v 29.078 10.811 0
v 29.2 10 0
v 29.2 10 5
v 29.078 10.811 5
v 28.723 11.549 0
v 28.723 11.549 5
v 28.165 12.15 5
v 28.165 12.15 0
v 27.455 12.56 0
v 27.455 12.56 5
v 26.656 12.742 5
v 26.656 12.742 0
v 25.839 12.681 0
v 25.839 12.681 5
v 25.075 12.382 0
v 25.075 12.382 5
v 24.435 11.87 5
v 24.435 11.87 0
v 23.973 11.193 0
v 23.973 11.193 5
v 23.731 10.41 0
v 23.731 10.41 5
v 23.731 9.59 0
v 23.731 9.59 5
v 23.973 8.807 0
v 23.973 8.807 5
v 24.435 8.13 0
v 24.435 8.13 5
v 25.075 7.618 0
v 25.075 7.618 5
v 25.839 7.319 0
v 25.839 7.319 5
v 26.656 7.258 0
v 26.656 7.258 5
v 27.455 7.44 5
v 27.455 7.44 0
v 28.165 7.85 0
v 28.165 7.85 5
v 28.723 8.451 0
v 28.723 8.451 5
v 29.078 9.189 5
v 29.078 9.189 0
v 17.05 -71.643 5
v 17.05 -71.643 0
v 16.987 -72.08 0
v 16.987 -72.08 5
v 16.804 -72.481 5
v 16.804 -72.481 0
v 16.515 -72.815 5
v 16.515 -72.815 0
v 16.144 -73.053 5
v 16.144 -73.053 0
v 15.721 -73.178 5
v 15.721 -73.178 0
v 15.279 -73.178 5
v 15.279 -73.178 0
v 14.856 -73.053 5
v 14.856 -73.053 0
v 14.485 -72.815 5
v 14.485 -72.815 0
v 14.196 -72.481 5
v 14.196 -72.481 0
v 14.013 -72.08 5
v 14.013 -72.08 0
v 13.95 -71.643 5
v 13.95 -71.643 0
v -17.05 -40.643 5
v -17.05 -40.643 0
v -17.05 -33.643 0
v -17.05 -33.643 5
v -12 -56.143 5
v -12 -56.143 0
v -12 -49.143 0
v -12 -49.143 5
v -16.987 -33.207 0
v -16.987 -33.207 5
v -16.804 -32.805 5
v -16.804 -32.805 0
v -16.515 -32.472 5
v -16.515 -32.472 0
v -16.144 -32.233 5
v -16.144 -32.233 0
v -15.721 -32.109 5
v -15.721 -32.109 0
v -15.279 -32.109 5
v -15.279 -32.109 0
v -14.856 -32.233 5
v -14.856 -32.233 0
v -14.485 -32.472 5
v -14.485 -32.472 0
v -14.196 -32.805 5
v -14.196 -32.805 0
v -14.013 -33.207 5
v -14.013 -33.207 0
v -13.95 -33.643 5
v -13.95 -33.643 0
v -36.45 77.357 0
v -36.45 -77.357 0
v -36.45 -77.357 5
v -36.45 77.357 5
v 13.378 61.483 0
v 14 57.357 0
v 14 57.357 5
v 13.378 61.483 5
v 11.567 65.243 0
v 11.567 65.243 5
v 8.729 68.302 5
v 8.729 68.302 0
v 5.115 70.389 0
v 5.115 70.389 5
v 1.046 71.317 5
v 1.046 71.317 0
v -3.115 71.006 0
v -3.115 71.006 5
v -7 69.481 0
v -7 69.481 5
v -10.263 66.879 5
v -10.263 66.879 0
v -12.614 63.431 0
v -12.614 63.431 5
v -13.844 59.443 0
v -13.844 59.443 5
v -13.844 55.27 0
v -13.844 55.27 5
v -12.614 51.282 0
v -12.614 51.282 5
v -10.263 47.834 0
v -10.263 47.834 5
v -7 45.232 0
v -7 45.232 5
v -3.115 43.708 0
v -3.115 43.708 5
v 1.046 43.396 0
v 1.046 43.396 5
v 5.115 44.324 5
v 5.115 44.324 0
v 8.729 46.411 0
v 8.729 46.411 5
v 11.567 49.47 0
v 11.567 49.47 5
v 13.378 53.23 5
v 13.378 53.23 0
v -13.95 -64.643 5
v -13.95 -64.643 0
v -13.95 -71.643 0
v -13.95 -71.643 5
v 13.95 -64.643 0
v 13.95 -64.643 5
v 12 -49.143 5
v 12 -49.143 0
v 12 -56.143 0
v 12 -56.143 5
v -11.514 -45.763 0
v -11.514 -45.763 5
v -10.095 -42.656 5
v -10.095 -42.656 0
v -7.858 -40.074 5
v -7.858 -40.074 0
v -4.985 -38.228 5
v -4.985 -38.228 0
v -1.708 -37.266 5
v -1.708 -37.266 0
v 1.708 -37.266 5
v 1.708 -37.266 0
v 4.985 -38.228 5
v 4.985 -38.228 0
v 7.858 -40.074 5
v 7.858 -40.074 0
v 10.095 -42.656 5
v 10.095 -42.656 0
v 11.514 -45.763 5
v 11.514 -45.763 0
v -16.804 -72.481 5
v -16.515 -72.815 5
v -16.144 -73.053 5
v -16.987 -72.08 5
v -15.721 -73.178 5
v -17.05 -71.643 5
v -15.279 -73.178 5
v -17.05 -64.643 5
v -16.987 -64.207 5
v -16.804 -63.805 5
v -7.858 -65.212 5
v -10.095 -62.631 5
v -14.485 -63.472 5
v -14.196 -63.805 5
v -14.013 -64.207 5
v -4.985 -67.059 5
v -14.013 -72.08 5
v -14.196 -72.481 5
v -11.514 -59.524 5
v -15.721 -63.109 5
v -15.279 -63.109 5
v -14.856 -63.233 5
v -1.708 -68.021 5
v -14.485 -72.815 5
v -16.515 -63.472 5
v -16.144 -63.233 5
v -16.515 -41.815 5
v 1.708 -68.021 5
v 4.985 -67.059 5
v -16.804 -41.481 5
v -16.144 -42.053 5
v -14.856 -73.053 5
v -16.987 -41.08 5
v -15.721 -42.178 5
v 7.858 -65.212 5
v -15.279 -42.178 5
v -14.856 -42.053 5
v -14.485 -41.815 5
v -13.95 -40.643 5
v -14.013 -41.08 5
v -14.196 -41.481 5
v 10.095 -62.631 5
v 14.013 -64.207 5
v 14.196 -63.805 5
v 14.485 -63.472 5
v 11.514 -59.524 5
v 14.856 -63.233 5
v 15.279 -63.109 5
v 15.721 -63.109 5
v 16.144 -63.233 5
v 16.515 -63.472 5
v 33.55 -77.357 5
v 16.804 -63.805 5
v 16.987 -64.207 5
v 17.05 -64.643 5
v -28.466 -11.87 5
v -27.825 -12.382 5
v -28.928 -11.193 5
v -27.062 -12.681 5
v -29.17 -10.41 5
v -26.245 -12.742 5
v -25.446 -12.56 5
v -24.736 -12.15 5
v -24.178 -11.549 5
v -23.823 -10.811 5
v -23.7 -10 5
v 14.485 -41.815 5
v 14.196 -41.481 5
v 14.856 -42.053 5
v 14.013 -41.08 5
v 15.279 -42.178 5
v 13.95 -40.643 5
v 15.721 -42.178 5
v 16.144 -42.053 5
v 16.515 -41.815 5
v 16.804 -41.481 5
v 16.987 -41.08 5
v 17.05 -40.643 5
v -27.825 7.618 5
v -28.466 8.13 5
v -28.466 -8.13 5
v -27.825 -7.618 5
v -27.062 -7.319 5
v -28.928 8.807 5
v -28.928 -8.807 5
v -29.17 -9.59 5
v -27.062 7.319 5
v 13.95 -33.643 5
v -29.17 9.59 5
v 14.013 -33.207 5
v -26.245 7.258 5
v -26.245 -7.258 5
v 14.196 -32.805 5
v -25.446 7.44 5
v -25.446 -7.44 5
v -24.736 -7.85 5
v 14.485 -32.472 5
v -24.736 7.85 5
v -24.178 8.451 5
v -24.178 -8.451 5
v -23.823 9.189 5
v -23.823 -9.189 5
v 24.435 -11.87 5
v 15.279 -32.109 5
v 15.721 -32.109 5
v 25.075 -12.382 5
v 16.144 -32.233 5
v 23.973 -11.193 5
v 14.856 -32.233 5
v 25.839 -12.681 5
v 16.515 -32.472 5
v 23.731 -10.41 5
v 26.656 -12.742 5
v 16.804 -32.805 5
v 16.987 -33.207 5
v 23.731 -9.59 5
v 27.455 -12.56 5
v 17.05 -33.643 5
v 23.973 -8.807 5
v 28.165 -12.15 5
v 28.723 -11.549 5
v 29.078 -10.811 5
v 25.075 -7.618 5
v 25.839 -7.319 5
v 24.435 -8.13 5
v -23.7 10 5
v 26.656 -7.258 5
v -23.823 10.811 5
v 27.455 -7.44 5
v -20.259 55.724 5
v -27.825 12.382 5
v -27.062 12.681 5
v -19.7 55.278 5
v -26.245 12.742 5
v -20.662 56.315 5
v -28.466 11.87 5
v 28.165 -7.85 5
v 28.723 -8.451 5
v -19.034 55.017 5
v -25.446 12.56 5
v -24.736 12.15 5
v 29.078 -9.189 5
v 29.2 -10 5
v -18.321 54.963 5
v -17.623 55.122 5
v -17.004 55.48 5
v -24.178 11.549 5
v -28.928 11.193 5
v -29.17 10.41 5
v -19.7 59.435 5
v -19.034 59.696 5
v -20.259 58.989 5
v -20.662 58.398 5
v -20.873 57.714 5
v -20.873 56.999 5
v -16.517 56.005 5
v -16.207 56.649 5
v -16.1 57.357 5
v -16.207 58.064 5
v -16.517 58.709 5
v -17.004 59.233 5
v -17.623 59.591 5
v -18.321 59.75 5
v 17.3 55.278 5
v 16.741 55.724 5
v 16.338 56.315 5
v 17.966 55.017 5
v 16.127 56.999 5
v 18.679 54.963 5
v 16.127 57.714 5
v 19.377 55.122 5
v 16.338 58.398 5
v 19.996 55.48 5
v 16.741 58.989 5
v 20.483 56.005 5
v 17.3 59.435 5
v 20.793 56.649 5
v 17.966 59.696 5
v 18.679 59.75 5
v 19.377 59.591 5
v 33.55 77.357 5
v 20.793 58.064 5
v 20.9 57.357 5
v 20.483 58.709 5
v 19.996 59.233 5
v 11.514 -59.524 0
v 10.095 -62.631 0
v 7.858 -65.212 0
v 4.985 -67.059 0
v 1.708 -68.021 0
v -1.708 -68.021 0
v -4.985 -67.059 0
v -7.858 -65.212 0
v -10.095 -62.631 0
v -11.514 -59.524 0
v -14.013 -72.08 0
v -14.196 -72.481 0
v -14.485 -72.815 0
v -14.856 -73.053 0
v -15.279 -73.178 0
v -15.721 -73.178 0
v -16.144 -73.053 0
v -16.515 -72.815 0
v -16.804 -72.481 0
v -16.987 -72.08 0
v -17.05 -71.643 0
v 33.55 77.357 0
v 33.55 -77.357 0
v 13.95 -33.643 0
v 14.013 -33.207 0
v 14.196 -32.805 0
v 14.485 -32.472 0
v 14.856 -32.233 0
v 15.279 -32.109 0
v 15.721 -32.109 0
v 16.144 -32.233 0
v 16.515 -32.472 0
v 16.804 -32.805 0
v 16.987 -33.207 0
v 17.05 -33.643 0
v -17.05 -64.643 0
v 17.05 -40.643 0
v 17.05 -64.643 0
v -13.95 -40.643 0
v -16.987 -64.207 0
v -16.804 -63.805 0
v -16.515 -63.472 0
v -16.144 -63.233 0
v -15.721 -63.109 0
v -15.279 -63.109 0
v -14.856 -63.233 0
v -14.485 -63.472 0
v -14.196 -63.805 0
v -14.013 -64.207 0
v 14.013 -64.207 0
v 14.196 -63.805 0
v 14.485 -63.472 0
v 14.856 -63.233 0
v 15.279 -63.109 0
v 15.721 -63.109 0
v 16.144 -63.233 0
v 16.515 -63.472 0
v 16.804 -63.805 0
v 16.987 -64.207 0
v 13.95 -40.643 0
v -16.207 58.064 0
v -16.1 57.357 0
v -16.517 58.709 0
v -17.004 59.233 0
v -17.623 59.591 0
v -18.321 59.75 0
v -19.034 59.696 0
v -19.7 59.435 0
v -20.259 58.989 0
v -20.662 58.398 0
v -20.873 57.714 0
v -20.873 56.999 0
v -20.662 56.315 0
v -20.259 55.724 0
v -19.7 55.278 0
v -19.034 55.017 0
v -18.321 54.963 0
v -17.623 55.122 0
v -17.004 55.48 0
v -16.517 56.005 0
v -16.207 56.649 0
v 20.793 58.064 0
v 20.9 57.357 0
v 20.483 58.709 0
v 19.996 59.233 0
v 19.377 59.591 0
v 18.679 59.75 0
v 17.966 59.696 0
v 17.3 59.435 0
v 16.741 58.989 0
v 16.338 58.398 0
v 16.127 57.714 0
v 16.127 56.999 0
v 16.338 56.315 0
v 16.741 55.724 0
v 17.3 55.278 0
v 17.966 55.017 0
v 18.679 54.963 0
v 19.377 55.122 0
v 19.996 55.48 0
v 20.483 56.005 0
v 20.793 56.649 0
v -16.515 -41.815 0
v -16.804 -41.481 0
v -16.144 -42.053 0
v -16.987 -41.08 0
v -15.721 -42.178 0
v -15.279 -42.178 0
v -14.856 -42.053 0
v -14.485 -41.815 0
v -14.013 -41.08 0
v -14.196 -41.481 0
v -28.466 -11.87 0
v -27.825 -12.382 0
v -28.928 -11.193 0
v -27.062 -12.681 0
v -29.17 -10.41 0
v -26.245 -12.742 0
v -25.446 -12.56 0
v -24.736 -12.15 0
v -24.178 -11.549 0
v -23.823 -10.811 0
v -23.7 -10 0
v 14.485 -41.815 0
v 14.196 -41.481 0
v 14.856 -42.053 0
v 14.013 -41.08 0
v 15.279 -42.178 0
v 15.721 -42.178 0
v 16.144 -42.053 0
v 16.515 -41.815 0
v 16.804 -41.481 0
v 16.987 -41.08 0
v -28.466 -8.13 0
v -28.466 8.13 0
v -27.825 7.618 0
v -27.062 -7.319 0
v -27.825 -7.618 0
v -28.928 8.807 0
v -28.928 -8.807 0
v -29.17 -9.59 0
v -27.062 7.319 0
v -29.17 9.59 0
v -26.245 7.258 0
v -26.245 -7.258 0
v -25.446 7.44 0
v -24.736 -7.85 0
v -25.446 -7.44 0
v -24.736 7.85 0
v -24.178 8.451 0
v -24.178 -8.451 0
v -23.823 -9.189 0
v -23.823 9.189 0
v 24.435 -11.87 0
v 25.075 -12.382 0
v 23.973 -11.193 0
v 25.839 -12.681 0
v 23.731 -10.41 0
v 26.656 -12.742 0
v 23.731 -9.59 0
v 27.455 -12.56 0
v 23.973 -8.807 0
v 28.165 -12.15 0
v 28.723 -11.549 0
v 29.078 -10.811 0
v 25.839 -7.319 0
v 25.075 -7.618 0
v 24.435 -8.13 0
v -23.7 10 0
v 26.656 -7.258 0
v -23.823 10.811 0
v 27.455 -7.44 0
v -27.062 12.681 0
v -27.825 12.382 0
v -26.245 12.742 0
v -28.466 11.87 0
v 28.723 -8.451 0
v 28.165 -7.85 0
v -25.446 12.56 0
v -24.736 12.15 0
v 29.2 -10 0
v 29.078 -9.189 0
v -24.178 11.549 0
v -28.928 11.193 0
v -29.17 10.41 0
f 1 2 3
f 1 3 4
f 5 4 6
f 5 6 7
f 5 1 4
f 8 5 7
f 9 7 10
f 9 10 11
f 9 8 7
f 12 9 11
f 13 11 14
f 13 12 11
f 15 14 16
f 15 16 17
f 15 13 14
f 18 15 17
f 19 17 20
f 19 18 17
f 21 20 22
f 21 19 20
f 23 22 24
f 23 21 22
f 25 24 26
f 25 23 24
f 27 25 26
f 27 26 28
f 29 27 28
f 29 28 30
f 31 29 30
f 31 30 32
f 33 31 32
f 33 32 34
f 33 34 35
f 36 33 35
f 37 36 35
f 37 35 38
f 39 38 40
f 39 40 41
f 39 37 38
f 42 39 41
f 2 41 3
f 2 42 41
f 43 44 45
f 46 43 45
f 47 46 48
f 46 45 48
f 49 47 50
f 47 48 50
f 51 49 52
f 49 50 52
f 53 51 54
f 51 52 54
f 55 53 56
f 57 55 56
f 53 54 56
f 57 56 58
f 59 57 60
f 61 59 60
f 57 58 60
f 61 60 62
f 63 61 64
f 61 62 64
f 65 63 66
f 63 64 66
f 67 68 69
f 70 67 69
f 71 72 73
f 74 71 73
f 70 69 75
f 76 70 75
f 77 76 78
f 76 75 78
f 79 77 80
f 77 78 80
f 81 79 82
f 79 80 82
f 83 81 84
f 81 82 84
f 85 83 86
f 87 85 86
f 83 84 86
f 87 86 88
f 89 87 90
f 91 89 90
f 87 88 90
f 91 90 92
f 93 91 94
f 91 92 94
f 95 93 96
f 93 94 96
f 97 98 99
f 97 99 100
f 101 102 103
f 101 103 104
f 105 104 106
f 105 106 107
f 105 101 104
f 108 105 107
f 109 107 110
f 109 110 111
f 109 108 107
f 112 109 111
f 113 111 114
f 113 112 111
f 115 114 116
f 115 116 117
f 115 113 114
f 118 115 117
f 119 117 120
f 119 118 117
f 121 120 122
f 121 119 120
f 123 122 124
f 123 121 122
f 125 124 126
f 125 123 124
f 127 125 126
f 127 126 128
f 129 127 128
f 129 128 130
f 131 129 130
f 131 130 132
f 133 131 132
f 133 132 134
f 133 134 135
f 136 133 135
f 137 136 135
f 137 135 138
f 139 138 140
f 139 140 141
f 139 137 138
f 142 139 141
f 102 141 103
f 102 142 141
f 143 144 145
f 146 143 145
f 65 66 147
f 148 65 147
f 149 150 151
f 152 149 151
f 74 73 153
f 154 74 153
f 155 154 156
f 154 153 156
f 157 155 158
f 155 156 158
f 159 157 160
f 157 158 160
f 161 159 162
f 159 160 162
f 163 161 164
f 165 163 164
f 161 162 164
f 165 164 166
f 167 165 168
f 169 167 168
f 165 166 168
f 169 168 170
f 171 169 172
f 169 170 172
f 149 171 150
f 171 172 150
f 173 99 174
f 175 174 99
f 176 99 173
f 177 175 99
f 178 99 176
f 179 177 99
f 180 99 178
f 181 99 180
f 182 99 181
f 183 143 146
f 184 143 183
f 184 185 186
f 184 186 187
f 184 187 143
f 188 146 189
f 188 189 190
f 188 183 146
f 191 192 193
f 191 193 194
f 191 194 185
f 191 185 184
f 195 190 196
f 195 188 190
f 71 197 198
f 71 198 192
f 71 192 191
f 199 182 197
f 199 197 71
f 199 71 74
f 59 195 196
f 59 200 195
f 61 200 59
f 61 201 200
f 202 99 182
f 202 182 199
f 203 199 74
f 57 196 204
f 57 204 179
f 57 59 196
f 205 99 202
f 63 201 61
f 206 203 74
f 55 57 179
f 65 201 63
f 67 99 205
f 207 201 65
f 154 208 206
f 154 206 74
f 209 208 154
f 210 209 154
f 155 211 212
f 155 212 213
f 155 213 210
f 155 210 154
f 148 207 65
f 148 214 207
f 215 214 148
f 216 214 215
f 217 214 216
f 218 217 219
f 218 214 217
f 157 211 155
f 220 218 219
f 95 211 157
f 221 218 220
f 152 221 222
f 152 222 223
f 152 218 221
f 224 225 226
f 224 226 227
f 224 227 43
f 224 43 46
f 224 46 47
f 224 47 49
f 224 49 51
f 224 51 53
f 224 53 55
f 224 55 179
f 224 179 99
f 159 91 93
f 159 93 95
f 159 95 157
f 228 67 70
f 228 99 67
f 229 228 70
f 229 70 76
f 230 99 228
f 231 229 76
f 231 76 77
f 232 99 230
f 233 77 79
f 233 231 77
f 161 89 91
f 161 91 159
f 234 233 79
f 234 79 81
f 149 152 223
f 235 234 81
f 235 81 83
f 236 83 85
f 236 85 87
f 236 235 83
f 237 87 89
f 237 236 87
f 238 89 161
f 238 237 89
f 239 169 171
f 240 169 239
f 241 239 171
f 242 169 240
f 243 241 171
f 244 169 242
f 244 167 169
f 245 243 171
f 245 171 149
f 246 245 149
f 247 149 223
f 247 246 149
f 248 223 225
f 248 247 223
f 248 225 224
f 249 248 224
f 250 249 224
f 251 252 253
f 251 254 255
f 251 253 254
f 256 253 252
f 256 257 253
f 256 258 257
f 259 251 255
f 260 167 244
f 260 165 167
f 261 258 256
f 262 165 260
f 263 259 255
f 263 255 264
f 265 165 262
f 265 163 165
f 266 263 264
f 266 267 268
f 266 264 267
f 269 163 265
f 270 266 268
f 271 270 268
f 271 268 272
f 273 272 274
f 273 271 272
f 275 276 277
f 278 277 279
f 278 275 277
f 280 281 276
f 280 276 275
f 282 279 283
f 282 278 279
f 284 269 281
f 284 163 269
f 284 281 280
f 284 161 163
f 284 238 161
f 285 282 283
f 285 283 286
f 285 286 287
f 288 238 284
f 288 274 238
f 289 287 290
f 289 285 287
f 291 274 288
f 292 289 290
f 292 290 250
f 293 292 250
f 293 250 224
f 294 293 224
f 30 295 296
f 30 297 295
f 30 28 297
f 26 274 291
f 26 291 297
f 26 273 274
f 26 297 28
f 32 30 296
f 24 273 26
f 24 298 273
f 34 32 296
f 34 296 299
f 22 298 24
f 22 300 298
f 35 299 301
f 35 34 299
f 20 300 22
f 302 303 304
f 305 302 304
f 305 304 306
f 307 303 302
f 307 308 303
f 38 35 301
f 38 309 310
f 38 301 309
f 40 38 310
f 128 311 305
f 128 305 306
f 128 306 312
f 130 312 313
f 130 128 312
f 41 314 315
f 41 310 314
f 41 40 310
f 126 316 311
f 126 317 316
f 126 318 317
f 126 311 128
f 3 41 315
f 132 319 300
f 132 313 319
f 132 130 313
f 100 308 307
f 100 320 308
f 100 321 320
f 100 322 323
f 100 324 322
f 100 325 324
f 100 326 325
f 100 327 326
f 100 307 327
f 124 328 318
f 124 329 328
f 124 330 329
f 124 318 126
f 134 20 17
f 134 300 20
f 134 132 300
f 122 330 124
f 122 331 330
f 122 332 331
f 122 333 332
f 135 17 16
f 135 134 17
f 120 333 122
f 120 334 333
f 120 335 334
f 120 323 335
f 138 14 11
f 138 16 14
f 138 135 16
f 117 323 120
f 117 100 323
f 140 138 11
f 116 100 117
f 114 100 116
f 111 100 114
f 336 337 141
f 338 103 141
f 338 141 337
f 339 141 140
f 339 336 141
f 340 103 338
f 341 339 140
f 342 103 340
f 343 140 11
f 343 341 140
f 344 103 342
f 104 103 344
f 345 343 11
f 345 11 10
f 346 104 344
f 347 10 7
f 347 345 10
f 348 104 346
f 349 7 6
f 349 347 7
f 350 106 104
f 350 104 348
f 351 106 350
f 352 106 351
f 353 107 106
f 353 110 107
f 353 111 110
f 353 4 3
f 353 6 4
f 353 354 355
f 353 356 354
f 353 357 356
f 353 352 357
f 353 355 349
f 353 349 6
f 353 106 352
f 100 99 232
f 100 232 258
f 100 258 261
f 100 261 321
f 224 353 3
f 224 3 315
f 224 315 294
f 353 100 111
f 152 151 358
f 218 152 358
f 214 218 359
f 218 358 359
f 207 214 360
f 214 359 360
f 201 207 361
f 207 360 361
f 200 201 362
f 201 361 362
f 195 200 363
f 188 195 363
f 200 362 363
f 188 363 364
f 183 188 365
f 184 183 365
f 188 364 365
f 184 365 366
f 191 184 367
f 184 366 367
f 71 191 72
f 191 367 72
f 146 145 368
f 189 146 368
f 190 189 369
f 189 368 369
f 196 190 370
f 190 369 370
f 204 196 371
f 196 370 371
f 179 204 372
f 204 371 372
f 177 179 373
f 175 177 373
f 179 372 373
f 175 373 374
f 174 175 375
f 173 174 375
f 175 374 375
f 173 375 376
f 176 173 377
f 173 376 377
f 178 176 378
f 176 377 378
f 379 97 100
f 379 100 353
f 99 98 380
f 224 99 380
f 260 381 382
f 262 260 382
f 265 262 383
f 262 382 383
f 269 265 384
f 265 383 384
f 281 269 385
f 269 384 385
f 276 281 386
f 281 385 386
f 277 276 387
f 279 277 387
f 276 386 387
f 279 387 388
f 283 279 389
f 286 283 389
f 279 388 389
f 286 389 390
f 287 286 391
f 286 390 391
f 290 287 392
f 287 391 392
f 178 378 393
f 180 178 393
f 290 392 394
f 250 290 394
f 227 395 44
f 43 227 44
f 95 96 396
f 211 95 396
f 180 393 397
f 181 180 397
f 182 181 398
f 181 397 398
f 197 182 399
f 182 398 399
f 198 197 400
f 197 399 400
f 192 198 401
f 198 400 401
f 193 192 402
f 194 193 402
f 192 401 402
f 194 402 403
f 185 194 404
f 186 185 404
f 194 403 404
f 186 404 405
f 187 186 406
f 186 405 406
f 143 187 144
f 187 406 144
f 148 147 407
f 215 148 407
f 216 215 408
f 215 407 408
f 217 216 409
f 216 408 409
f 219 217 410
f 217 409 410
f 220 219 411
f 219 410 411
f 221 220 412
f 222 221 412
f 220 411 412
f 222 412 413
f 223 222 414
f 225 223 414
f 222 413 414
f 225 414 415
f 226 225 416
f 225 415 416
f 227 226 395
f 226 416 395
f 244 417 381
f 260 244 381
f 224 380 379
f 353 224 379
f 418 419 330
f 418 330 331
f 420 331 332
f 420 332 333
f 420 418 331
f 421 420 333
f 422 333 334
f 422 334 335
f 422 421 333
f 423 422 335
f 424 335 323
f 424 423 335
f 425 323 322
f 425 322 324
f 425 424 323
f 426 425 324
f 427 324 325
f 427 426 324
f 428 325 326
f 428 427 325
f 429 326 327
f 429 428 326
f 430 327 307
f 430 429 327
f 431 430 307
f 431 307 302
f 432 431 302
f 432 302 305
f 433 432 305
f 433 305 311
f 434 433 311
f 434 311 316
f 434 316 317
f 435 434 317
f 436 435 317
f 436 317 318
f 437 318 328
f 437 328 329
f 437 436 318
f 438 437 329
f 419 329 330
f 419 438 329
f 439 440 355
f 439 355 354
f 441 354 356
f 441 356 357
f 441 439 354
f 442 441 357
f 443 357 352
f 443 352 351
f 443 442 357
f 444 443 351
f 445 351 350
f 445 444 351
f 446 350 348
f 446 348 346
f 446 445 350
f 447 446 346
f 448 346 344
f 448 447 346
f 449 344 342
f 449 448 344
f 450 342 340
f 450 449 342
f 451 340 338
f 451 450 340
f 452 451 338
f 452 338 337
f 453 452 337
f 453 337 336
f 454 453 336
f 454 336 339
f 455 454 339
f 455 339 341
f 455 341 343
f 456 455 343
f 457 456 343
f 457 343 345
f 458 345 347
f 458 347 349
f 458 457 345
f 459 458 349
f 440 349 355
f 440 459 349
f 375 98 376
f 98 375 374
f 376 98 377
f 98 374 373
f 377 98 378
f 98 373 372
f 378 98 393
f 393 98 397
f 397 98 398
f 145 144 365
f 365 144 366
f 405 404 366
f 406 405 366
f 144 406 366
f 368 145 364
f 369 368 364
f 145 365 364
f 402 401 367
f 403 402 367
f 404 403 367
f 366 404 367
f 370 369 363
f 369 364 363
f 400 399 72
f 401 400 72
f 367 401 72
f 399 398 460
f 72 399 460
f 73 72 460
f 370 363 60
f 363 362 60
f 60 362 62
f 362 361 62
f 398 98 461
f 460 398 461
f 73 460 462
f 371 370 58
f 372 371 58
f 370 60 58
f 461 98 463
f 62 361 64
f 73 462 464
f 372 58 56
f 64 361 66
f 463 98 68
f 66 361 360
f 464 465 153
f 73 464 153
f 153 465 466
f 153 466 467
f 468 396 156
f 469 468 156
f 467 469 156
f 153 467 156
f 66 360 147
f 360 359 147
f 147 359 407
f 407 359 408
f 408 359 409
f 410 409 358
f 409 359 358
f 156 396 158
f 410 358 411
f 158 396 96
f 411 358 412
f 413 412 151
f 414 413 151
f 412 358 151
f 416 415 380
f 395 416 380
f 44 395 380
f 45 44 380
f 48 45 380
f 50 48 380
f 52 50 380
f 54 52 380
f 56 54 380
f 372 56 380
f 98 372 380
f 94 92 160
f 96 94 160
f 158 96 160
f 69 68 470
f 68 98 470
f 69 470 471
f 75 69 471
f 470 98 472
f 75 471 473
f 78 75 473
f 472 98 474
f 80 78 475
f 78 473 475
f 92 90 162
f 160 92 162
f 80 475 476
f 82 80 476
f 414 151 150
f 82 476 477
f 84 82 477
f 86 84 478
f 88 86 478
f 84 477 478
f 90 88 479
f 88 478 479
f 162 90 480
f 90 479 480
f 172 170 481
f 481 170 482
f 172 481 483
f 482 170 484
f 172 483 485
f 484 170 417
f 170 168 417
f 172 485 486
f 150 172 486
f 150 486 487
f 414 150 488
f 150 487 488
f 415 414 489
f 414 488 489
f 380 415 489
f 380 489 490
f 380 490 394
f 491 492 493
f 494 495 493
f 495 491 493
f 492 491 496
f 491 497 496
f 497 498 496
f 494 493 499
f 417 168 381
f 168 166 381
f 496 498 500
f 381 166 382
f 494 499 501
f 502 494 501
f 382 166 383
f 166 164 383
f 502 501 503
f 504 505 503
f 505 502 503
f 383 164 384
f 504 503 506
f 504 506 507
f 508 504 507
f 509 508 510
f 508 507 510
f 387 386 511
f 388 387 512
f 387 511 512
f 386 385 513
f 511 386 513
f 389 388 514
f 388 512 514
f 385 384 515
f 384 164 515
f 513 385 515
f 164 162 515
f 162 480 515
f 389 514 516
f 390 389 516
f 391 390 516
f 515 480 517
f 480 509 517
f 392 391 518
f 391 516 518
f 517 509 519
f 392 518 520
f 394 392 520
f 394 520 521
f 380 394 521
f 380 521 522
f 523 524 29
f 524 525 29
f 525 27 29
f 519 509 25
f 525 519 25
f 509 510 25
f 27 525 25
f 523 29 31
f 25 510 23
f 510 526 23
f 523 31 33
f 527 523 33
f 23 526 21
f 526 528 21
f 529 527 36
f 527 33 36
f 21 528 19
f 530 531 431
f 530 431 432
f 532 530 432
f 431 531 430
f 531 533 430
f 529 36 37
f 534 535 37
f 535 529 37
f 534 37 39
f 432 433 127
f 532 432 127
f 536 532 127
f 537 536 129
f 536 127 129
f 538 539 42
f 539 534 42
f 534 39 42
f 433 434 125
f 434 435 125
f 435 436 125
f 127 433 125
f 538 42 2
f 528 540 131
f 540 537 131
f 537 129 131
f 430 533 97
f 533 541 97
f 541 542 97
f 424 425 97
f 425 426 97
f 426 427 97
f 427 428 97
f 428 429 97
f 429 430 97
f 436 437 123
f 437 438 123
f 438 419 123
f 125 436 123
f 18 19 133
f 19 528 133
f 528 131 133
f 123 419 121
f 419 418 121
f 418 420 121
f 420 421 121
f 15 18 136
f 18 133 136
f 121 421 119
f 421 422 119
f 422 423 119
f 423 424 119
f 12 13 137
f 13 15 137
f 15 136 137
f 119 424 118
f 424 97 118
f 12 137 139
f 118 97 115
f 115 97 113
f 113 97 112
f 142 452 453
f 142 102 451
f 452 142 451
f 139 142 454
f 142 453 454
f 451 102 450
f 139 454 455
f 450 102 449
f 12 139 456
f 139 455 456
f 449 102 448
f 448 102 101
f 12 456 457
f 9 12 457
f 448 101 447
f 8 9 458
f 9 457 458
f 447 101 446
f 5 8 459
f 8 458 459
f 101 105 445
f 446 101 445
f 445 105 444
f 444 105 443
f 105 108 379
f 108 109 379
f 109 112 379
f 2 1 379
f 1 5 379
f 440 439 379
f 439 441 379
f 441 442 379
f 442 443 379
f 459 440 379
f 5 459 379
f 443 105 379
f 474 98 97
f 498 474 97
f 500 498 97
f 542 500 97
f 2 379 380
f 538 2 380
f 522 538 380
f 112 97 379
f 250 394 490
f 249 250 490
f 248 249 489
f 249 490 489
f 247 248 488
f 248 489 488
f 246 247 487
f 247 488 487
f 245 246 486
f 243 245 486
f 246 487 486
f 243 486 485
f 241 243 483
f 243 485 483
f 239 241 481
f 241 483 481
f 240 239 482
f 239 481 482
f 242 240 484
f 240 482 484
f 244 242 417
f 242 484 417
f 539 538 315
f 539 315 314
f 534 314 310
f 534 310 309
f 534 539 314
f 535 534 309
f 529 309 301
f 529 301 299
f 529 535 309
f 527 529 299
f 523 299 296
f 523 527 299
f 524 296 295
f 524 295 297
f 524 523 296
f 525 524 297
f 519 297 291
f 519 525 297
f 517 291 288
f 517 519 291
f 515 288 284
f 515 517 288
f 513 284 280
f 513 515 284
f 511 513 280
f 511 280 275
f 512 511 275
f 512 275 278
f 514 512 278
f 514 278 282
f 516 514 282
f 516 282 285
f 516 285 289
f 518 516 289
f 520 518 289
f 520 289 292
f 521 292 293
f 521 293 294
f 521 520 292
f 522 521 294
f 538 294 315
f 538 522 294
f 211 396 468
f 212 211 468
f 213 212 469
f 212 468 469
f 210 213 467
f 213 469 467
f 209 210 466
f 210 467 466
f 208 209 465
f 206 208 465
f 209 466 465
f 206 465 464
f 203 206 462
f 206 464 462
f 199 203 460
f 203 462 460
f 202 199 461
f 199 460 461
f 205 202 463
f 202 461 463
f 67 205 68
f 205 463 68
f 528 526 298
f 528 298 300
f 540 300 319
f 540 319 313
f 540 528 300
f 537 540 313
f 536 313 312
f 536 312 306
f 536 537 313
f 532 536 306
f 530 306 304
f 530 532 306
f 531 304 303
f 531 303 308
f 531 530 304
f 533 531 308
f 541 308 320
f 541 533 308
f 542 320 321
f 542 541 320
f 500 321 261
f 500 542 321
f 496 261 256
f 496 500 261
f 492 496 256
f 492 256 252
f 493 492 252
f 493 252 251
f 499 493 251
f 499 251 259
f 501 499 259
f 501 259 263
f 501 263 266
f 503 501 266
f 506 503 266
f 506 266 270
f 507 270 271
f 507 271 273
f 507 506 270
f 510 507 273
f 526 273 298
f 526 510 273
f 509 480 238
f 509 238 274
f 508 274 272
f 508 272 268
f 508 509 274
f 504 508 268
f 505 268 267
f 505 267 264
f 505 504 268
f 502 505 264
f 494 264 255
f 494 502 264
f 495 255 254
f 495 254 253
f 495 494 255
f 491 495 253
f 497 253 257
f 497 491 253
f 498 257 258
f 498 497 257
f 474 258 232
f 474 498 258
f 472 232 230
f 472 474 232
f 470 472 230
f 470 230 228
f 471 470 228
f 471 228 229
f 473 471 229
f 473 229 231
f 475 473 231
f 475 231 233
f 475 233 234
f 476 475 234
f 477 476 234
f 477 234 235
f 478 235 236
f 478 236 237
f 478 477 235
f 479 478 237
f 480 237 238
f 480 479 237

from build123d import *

# Parameters (mm, degrees)
SKETCH1_W           = 70
SKETCH1_H           = 154.713144252
SKETCH1_R           = 2.4
SKETCH1_R_2         = 2.75
SKETCH1_R_3         = 14
BOSS_EXTRUDE1_DEPTH = 5


with BuildPart() as part:
    # Sketch1 → Boss-Extrude1 (new body)
    with BuildSketch(Plane.XY):
        with Locations((-1.450472168, 0)):
            Rectangle(SKETCH1_W, SKETCH1_H)
        with Locations((-18.5, 57.356572126)):
            Circle(SKETCH1_R, mode=Mode.SUBTRACT)
        with Locations((18.5, 57.356572126)):
            Circle(SKETCH1_R, mode=Mode.SUBTRACT)
        with Locations((-26.450472168, 10)):
            Circle(SKETCH1_R_2, mode=Mode.SUBTRACT)
        with Locations((26.450472168, 10)):
            Circle(SKETCH1_R_2, mode=Mode.SUBTRACT)
        with Locations((26.450472168, -10)):
            Circle(SKETCH1_R_2, mode=Mode.SUBTRACT)
        with Locations((-26.450472168, -10)):
            Circle(SKETCH1_R_2, mode=Mode.SUBTRACT)
        with Locations((0, 57.356572126)):
            Circle(SKETCH1_R_3, mode=Mode.SUBTRACT)
        with BuildLine():
            Line((-13.95, -33.643427874), (-13.95, -40.643427874))
            ThreePointArc((-13.95, -40.643427874), (-15.5, -42.193427874), (-17.05, -40.643427874))
            Line((-17.05, -40.643427874), (-17.05, -33.643427874))
            ThreePointArc((-17.05, -33.643427874), (-15.5, -32.093427874), (-13.95, -33.643427874))
        make_face(mode=Mode.SUBTRACT)
        with BuildLine():
            Line((17.05, -33.643427874), (17.05, -40.643427874))
            ThreePointArc((17.05, -40.643427874), (15.5, -42.193427874), (13.95, -40.643427874))
            Line((13.95, -40.643427874), (13.95, -33.643427874))
            ThreePointArc((13.95, -33.643427874), (15.5, -32.093427874), (17.05, -33.643427874))
        make_face(mode=Mode.SUBTRACT)
        with BuildLine():
            Line((17.05, -64.643427874), (17.05, -71.643427874))
            ThreePointArc((17.05, -71.643427874), (15.5, -73.193427874), (13.95, -71.643427874))
            Line((13.95, -71.643427874), (13.95, -64.643427874))
            ThreePointArc((13.95, -64.643427874), (15.5, -63.093427874), (17.05, -64.643427874))
        make_face(mode=Mode.SUBTRACT)
        with BuildLine():
            Line((-13.95, -64.643427874), (-13.95, -71.643427874))
            ThreePointArc((-13.95, -71.643427874), (-15.5, -73.193427874), (-17.05, -71.643427874))
            Line((-17.05, -71.643427874), (-17.05, -64.643427874))
            ThreePointArc((-17.05, -64.643427874), (-15.5, -63.093427874), (-13.95, -64.643427874))
        make_face(mode=Mode.SUBTRACT)
        with BuildLine():
            Line((-12, -56.143427874), (-12, -49.143427874))
            ThreePointArc((-12, -49.143427874), (0, -37.143427874), (12, -49.143427874))
            Line((12, -49.143427874), (12, -56.143427874))
            ThreePointArc((12, -56.143427874), (0, -68.143427874), (-12, -56.143427874))
        make_face(mode=Mode.SUBTRACT)
    extrude(amount=BOSS_EXTRUDE1_DEPTH)


solid = part.part
